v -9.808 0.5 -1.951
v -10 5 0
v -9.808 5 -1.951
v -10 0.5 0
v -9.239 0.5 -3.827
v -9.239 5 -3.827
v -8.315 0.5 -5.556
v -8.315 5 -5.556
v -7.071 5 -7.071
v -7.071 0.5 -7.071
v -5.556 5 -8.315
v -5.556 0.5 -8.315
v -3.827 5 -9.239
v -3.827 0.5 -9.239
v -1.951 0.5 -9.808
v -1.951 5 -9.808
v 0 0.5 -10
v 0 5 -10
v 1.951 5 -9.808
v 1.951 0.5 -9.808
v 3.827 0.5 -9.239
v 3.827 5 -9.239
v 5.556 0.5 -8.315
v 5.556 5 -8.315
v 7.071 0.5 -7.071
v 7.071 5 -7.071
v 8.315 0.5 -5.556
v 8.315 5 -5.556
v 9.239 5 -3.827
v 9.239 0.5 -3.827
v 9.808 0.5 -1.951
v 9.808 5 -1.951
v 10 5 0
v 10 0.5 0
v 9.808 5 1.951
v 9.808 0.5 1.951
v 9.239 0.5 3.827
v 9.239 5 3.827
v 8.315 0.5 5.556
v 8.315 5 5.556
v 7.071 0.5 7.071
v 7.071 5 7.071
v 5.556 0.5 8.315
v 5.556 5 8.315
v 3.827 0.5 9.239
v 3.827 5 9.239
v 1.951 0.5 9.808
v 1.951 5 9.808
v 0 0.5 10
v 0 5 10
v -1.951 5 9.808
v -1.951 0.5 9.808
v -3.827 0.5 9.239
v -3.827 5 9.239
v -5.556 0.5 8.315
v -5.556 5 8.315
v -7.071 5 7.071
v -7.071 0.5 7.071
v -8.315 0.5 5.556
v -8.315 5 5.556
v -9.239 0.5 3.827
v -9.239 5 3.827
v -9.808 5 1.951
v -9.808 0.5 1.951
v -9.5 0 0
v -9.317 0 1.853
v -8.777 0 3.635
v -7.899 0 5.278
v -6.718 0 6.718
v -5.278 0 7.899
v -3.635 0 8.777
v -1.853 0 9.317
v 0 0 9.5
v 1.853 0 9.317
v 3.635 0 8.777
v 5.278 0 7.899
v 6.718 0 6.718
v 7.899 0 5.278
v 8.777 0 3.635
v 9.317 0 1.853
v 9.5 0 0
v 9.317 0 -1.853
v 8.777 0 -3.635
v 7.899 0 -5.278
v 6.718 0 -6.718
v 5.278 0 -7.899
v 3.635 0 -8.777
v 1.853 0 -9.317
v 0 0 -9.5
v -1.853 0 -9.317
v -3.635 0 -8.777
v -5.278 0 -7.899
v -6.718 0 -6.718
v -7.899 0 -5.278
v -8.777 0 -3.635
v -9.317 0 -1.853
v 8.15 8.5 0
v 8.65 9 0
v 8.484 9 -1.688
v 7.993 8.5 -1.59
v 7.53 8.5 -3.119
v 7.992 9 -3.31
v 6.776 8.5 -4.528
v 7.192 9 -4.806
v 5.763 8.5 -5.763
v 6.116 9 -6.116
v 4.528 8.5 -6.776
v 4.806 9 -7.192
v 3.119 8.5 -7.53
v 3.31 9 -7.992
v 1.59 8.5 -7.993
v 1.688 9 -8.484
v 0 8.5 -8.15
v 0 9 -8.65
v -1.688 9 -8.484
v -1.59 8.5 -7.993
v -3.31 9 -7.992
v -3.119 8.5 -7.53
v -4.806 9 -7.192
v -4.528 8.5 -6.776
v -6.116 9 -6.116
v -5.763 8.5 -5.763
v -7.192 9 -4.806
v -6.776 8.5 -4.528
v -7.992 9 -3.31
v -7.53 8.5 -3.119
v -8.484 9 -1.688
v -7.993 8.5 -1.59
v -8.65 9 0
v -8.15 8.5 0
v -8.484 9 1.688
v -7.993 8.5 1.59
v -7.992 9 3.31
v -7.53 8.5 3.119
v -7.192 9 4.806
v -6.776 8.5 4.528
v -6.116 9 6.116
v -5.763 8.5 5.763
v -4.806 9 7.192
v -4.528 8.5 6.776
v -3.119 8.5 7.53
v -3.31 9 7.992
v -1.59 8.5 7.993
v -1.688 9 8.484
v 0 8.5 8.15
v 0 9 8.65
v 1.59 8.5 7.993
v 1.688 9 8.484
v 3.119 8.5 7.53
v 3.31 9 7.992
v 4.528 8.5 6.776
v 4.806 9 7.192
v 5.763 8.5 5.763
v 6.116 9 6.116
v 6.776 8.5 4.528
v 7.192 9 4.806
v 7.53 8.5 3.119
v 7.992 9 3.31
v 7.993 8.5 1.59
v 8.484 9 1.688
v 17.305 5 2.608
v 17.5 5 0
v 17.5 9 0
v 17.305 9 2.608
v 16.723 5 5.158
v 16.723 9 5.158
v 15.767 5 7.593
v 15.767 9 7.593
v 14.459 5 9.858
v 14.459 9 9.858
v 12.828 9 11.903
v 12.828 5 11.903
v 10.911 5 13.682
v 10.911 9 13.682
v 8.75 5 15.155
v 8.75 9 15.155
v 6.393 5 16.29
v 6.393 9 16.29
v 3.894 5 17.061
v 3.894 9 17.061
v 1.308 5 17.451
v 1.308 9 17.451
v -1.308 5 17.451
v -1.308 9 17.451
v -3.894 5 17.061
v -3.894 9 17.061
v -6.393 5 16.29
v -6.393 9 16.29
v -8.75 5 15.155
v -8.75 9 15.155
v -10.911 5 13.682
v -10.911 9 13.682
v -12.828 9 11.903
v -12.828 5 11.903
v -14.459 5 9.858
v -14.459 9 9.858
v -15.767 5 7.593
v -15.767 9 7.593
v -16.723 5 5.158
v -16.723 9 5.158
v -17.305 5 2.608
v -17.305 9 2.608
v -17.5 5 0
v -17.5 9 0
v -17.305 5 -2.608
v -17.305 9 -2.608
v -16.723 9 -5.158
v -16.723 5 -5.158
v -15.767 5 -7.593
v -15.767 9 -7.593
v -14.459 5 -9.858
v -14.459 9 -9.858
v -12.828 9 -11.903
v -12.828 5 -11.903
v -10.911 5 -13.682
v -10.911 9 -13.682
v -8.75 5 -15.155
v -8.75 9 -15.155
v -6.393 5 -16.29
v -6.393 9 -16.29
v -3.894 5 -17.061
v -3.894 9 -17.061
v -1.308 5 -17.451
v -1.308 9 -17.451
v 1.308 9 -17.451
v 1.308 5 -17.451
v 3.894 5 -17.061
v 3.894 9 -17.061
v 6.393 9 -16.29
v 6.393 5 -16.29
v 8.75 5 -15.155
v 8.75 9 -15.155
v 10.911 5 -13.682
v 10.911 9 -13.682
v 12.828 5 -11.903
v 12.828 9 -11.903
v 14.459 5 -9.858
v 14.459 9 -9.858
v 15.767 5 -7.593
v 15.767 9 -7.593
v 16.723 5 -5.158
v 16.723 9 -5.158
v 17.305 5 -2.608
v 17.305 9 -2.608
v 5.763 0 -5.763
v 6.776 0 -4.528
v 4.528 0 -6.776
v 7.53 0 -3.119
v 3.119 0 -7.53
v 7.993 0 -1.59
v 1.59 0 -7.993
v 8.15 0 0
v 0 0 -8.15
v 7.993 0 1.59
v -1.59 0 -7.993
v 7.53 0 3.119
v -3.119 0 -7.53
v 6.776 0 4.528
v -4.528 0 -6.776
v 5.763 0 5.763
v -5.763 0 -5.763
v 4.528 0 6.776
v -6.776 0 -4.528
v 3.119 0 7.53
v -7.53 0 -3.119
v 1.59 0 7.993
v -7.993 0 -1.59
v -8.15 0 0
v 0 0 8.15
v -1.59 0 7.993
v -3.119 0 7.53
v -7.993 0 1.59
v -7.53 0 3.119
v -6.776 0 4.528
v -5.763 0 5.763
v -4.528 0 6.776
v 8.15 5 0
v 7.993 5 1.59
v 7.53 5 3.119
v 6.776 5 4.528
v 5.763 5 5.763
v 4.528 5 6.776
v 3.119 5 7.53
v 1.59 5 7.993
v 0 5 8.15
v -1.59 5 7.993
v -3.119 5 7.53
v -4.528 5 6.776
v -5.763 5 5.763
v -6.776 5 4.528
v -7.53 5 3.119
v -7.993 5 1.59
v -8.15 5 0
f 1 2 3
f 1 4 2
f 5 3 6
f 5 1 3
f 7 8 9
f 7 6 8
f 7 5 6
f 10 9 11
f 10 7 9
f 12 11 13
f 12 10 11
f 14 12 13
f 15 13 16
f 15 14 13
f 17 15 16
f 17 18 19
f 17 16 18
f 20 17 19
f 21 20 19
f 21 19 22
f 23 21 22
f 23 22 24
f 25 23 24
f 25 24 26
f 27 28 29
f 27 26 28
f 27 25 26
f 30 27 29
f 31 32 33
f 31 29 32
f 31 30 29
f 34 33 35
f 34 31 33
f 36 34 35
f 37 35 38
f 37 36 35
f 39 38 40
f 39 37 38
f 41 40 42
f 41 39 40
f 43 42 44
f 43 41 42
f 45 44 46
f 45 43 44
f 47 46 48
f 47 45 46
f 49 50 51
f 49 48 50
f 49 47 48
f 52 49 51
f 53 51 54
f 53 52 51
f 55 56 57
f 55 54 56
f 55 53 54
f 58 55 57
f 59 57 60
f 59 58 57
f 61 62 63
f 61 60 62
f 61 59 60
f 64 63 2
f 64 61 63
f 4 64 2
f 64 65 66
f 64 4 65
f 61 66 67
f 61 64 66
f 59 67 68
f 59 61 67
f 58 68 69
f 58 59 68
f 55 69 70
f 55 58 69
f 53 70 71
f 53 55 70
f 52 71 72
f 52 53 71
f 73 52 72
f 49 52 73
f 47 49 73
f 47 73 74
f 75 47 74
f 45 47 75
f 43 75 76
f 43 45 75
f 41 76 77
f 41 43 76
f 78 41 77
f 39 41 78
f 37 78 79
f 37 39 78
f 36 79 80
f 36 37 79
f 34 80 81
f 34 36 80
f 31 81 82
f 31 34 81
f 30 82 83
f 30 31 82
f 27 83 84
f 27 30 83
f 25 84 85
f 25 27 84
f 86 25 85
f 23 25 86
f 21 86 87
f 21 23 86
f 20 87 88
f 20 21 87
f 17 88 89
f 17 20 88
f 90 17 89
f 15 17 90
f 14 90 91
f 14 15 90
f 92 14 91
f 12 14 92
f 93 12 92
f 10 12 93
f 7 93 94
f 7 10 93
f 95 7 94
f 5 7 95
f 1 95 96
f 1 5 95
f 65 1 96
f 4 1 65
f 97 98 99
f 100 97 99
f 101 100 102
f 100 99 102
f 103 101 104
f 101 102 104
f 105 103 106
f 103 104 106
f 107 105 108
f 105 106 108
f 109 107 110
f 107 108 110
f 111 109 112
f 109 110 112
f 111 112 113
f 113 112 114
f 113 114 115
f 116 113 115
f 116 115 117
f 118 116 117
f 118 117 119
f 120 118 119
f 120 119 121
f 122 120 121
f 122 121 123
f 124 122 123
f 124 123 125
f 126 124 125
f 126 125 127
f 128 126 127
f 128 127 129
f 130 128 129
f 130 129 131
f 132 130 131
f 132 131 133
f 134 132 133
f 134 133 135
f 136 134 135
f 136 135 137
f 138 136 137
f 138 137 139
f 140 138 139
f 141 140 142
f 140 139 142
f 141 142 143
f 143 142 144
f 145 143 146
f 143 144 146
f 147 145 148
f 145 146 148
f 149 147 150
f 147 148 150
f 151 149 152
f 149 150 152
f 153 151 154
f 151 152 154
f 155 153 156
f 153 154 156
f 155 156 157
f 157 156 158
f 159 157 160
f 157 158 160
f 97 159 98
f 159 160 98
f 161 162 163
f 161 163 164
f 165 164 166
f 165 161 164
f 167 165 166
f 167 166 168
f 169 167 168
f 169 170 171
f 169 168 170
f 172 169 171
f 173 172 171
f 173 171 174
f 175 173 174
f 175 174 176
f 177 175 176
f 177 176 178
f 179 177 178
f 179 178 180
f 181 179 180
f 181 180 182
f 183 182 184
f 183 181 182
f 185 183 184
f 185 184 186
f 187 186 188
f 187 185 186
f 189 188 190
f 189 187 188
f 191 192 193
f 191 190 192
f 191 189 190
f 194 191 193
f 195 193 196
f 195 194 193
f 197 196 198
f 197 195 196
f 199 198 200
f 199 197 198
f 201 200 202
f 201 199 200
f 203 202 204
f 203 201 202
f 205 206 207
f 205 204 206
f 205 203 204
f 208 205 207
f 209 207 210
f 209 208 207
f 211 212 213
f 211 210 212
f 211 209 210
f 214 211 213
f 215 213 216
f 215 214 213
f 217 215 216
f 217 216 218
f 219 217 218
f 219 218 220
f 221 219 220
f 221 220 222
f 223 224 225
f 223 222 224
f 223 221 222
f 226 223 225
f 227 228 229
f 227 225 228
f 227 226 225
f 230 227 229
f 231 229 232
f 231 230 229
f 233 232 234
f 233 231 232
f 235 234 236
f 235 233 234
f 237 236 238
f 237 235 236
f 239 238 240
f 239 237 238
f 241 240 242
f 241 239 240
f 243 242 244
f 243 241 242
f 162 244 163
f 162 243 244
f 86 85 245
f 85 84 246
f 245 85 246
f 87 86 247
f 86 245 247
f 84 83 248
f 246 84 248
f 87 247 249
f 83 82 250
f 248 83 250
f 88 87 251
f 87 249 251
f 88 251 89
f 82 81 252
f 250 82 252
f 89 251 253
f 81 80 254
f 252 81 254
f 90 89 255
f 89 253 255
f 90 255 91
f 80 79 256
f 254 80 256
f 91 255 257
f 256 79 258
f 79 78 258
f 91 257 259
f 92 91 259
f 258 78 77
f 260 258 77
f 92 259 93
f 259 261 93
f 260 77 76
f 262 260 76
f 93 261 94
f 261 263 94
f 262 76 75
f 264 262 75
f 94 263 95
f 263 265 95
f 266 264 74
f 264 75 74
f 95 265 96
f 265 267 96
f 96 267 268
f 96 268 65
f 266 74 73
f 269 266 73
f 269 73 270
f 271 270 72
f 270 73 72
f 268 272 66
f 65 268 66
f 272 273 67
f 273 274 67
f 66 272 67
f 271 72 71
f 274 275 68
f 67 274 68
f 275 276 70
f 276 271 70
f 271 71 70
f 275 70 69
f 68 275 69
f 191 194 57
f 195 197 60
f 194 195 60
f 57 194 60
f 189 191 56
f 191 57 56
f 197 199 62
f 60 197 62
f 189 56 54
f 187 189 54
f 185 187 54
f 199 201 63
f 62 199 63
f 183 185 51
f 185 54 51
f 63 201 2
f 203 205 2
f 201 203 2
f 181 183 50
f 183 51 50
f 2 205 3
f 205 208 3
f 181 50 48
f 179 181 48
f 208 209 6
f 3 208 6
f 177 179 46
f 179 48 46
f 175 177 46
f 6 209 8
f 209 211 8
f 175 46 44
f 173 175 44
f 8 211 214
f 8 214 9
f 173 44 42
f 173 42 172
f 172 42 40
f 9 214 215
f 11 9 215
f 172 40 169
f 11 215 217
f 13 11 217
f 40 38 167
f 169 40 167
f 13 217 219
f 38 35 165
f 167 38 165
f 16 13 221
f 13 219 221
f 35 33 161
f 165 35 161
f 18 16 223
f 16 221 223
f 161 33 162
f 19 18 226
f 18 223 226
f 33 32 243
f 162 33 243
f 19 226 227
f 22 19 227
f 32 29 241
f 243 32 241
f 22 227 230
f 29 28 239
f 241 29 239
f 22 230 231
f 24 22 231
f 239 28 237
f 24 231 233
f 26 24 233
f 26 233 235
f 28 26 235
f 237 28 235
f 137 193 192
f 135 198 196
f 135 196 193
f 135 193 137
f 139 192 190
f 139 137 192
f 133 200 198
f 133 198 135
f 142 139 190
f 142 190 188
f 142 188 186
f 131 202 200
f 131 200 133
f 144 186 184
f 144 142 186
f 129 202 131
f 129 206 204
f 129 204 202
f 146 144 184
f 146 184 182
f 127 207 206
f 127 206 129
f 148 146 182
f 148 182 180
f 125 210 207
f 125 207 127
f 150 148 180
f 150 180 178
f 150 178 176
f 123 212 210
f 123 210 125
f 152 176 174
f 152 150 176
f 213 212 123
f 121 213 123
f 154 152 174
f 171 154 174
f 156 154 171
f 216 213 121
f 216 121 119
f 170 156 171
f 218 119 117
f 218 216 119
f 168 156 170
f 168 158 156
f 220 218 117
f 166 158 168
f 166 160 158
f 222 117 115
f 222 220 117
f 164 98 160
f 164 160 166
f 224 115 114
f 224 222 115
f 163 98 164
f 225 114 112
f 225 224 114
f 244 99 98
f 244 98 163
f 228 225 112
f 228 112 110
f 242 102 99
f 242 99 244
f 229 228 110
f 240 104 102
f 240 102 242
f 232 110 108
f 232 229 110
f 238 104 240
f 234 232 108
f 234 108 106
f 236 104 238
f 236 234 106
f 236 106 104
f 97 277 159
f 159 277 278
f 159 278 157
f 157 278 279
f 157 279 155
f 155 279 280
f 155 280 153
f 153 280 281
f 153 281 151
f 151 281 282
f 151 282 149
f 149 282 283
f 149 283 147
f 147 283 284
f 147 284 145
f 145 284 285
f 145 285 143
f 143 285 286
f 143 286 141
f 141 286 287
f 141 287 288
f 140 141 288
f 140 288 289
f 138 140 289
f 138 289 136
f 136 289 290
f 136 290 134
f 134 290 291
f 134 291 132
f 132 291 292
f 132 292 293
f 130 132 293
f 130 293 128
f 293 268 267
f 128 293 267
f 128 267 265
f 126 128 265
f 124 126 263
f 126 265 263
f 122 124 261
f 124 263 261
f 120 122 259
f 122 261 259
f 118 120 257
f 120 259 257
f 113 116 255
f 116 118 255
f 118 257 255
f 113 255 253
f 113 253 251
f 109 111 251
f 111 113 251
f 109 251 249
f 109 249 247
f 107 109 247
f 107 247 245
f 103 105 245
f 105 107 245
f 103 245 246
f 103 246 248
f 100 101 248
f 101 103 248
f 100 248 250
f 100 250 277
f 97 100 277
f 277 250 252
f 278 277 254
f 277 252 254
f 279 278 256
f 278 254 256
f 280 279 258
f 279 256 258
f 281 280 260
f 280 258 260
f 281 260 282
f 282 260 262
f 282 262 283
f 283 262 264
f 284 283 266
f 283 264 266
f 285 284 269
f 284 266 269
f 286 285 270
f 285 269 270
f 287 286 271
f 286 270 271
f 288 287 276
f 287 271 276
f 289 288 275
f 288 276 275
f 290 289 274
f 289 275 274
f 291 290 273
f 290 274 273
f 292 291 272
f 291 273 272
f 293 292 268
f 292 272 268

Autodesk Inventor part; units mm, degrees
ref_plane "YZ Plane" through (0, 0, 0) normal (1, 0, 0) x (0, 1, 0)
ref_plane "XZ Plane" through (0, 0, 0) normal (0, 1, 0) x (-1, 0, 0)
ref_plane "XY Plane" through (0, 0, 0) normal (0, 0, 1) x (1, 0, 0)
sketch "Sketch1" plane through (0, 0, 0) normal (0, 1, 0) x (-1, 0, 0)
  circle A0 centre (0, 0) radius 8.15
  circle A1 centre (0, 0) radius 10
  dimension "d0" = 16.3
  dimension "d1" = 20
extrude "Extrusion1" add sketch "Sketch1" along normal blind 5
sketch "Sketch2" plane through (0, 5, 0) normal (0, 1, 0) x (1, 0, 0)
  circle A0 centre (0, 0) radius 10 projected
  circle A1 centre (0, 0) radius 8.15 projected
  circle A2 centre (0, 0) radius 17.5
  dimension "d4" = 35
extrude "Extrusion2" add sketch "Sketch2" along normal blind 4 contours A0 | A2
chamfer "Chamfer1" distance 0.5 angle 45 2 edges at (10, 0, 0) (-8.15, 9, 0)
properties part number "Ydre_bøsning_stempel_stang"
